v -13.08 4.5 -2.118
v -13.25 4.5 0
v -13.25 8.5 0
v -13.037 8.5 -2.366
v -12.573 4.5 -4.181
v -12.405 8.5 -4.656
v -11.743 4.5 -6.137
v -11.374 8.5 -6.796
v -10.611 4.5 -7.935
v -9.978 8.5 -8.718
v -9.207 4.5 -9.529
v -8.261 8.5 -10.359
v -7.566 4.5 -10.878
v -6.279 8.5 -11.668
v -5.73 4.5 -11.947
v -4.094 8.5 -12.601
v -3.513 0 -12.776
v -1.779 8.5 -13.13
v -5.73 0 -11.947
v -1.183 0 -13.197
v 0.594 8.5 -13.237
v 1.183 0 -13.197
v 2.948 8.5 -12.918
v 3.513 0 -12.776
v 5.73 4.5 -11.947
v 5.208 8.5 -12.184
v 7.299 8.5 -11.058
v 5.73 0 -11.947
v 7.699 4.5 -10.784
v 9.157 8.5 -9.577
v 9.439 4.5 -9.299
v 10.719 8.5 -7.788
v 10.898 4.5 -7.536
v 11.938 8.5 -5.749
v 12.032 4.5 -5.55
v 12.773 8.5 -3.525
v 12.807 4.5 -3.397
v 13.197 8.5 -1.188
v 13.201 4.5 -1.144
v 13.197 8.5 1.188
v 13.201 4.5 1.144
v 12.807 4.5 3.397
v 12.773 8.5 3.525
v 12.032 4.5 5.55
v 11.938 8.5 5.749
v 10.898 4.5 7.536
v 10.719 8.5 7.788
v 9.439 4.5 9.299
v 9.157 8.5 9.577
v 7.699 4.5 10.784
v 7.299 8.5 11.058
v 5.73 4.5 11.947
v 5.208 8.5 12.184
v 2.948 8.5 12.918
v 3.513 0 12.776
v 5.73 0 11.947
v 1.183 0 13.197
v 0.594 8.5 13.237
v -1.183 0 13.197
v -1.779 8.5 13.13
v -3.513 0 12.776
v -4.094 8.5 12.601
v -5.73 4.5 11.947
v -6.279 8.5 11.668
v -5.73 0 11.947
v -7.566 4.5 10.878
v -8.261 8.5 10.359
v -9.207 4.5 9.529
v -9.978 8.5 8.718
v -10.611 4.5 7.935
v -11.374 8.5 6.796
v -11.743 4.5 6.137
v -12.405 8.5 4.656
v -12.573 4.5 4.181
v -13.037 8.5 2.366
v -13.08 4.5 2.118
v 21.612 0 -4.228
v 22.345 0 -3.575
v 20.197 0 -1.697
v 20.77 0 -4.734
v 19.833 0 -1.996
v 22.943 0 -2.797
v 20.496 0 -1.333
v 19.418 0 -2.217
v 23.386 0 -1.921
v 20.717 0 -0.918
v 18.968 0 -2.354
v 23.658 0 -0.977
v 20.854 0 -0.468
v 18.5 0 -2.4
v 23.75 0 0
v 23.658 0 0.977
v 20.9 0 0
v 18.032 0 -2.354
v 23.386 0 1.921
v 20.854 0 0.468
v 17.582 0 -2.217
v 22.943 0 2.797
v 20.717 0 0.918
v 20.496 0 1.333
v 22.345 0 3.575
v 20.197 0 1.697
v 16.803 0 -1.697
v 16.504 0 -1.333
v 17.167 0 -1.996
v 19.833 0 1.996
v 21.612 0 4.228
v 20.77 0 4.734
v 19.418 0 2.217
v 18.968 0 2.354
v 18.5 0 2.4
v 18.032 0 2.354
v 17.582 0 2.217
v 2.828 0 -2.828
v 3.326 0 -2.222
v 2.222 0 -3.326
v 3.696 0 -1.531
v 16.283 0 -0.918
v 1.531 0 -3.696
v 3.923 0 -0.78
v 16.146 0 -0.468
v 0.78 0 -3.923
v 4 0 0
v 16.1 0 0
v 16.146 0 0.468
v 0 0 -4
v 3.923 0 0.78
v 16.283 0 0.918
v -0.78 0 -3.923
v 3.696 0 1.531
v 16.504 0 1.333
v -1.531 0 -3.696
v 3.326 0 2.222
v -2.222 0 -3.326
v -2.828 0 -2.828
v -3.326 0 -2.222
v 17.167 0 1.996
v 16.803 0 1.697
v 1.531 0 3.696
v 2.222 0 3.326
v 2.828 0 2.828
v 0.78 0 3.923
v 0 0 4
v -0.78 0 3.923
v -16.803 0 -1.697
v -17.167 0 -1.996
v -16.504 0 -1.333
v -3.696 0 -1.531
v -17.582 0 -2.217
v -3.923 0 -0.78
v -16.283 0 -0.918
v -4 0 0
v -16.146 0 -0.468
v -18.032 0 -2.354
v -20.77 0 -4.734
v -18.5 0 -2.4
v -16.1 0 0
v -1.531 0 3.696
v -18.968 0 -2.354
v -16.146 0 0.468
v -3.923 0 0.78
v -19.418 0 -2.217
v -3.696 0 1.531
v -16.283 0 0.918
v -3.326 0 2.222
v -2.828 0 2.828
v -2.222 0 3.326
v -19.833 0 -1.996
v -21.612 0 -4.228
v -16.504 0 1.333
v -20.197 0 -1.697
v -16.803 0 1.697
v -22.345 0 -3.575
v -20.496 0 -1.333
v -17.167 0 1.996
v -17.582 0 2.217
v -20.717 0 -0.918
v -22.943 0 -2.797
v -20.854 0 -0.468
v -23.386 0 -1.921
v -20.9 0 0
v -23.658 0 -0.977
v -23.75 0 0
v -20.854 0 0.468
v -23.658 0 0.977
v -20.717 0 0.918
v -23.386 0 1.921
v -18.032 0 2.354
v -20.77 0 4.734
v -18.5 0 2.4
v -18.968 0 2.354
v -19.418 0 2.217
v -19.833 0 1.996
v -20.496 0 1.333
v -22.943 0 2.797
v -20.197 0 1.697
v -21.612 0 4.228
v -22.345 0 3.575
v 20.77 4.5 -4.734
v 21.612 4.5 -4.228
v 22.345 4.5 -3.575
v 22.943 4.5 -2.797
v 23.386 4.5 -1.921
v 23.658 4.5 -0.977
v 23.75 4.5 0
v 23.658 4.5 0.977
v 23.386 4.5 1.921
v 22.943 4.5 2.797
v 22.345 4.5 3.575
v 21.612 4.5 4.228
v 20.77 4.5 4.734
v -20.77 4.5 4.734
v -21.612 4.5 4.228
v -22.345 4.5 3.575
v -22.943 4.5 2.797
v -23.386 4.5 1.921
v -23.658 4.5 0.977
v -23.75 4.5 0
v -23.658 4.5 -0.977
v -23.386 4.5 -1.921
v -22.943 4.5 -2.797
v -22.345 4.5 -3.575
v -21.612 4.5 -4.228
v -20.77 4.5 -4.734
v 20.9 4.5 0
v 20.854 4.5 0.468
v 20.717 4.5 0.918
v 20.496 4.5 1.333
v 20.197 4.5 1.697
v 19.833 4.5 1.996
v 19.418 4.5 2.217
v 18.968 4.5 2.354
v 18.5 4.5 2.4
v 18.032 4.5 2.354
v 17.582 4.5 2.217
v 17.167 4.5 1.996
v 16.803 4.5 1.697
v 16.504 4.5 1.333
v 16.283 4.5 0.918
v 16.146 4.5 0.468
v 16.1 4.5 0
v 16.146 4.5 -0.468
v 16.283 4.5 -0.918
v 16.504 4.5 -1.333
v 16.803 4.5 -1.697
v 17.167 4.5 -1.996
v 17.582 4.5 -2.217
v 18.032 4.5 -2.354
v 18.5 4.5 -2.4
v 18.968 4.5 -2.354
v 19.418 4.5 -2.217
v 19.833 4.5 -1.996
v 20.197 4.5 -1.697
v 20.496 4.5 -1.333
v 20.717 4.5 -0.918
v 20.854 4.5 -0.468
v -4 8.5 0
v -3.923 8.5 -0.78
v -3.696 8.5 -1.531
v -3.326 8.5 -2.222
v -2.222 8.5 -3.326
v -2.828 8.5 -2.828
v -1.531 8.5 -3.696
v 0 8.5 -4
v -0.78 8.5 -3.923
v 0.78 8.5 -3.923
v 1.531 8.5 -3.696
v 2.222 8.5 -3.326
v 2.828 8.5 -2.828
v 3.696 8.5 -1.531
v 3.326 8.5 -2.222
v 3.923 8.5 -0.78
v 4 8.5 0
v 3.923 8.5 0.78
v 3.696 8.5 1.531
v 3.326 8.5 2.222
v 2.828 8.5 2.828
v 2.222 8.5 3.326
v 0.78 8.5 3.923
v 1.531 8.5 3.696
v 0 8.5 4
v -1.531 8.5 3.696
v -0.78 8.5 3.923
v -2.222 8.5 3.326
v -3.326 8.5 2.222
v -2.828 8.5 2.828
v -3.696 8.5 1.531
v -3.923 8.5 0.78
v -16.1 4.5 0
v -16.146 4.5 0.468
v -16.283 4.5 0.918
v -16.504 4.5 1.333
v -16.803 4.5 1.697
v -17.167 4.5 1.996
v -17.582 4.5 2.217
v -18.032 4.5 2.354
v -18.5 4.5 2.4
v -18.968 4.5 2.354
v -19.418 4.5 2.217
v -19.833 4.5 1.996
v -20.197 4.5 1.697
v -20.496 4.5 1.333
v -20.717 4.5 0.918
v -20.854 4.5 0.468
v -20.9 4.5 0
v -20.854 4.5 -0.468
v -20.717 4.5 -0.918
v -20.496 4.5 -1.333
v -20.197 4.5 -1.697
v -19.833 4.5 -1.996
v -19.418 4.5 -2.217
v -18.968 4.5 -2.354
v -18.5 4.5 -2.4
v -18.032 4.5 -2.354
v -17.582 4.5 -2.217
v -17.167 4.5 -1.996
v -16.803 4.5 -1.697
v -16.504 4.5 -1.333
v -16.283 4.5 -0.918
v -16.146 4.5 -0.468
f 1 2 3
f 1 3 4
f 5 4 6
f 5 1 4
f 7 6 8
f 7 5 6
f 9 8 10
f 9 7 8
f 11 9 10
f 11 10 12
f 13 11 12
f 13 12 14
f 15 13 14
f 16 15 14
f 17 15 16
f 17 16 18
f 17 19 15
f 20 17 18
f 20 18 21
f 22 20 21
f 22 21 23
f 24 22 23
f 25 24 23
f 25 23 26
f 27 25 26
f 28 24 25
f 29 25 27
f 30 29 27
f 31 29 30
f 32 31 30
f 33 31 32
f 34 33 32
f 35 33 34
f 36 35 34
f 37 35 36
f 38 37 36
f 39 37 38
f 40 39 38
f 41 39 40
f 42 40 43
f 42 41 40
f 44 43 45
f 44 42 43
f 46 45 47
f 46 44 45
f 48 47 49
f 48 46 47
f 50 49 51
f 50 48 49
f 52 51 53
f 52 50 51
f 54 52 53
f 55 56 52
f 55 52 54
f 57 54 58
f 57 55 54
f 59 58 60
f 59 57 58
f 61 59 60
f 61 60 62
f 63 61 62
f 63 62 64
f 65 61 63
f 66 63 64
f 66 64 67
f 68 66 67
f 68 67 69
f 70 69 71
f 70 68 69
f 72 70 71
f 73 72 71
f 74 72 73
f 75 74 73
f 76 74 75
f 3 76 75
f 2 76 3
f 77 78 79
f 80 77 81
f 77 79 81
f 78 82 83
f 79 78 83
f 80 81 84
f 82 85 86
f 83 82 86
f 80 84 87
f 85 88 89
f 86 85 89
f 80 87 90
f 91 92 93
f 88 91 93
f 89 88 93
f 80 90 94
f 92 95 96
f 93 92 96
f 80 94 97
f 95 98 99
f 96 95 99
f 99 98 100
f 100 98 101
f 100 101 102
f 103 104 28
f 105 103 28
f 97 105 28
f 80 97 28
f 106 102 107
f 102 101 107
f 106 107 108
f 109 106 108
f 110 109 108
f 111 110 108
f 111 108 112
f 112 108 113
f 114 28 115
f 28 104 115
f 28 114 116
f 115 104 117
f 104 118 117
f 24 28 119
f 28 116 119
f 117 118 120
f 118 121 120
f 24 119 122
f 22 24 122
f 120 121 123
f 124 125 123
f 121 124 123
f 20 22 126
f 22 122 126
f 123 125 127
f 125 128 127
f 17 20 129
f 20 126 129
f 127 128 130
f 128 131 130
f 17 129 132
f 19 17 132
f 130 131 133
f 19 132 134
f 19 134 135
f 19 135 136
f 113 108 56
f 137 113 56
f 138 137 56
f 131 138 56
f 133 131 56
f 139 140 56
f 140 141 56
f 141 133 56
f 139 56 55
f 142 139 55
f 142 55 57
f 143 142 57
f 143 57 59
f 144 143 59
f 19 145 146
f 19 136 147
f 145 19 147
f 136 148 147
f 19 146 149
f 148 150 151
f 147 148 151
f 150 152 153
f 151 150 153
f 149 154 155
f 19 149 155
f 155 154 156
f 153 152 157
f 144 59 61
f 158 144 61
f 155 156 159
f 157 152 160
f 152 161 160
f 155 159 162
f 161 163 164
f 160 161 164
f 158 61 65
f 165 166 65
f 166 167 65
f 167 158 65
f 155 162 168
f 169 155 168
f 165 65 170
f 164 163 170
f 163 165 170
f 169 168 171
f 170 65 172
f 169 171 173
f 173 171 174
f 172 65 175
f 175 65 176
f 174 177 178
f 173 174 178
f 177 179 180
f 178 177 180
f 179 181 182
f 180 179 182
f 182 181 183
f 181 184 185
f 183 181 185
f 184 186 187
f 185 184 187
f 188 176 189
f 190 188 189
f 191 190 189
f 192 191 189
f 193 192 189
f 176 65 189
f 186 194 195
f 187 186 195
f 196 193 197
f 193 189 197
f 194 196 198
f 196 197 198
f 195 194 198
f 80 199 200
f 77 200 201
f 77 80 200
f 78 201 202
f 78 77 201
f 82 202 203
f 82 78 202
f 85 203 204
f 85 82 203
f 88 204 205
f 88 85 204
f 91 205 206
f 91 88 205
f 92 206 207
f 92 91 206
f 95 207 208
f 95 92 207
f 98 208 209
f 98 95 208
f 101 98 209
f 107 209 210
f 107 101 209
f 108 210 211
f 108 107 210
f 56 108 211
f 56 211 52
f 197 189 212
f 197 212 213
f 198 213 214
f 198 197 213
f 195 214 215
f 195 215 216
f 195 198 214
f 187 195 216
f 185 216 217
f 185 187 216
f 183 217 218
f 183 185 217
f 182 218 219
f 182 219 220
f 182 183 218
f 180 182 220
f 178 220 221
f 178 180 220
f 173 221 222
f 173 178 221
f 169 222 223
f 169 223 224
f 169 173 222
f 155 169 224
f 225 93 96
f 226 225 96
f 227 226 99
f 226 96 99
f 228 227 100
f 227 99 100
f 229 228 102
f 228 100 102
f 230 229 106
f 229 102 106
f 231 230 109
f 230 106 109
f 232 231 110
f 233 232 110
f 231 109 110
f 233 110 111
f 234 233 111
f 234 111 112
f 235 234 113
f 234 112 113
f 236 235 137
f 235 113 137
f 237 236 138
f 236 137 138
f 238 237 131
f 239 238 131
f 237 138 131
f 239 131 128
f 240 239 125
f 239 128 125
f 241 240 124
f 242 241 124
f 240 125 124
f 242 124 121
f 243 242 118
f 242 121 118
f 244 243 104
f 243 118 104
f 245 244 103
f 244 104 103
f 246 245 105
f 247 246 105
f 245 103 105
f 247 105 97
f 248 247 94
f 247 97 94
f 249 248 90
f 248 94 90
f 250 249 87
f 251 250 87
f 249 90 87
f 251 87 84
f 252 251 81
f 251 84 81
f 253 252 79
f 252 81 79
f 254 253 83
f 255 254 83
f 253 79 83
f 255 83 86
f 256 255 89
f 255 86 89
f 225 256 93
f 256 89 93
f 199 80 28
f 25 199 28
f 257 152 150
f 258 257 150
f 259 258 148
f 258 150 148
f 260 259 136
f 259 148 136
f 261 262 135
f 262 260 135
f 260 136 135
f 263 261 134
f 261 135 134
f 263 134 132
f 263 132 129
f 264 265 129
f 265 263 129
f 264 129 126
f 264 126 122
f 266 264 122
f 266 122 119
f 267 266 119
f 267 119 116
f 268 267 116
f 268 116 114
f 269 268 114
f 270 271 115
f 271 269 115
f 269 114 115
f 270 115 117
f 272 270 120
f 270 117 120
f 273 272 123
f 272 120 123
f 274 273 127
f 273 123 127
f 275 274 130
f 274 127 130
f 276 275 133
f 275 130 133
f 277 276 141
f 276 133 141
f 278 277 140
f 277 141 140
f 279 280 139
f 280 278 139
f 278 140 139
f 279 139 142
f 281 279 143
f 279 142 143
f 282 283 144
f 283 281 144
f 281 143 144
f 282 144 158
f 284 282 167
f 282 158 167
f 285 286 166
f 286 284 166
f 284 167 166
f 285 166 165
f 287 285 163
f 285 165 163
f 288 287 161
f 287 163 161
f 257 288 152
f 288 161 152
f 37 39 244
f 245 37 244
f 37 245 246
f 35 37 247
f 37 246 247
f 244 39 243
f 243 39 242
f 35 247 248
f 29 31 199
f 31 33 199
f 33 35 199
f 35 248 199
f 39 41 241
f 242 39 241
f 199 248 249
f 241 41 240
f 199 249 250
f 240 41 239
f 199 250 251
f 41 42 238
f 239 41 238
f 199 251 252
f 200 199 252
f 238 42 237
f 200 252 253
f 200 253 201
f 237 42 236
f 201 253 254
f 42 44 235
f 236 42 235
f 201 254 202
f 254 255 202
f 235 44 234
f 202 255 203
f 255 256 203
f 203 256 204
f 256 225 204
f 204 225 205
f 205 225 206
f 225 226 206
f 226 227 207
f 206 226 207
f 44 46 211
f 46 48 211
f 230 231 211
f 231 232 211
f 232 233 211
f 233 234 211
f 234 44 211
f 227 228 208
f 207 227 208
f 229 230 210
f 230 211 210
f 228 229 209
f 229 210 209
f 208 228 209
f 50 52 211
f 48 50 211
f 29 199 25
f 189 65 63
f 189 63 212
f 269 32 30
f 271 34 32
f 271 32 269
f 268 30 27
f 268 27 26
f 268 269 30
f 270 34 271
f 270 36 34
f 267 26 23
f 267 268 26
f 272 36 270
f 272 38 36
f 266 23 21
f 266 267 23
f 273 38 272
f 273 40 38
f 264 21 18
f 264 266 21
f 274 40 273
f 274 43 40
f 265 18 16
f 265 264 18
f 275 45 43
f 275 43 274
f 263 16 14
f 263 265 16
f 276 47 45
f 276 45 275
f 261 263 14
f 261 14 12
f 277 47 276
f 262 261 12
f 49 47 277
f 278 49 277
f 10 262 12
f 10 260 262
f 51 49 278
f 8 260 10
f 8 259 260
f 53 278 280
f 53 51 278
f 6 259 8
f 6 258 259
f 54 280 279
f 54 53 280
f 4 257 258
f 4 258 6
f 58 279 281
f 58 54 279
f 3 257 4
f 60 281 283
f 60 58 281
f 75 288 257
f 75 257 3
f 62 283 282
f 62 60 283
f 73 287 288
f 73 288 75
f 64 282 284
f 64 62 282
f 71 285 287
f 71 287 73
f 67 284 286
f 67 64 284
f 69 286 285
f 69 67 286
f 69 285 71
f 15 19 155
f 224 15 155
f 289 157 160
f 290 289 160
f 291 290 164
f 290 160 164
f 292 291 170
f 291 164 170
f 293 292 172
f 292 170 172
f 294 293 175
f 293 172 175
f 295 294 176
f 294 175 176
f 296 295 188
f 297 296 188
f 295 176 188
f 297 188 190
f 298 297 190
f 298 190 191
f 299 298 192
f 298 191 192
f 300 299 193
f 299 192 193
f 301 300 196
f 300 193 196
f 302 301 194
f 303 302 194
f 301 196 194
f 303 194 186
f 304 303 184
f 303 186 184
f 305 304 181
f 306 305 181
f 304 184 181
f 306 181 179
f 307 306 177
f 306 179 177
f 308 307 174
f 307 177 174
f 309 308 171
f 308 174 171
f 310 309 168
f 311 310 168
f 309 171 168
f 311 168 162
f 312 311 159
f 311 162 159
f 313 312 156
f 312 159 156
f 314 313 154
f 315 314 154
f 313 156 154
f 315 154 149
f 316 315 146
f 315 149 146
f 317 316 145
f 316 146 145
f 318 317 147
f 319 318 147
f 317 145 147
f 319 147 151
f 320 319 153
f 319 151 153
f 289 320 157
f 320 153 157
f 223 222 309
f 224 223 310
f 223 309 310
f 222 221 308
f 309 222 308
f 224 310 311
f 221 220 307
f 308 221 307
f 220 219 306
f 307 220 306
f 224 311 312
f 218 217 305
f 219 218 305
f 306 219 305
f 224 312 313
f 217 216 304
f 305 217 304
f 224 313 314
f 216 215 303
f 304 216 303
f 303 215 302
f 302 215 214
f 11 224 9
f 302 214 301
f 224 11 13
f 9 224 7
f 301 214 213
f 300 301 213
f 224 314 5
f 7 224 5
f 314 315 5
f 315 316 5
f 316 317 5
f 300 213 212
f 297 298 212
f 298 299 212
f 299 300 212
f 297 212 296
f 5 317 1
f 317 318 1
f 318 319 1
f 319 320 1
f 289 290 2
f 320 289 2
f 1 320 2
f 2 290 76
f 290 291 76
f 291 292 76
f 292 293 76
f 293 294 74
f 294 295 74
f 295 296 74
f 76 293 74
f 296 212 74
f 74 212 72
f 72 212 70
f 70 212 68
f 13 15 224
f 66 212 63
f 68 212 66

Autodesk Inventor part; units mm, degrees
ref_plane "YZ Plane" through (0, 0, 0) normal (1, 0, 0) x (0, 1, 0)
ref_plane "XZ Plane" through (0, 0, 0) normal (0, 1, 0) x (-1, 0, 0)
ref_plane "XY Plane" through (0, 0, 0) normal (0, 0, 1) x (1, 0, 0)
sketch "Sketch1" plane through (0, 0, 0) normal (0, 1, 0) x (-1, 0, 0)
  circle A0 centre (0, 0) radius 13.25
  circle A1 centre (0, 0) radius 4
  dimension "d0" = 26.5
  dimension "d1" = 8
extrude "Extrusion1" add sketch "Sketch1" along normal blind 8.5
sketch "Sketch2" plane through (0, 0, 0) normal (0, -1, 0) x (1, 0, 0)
  circle A0 centre (18.5, 0) radius 2.4
  circle A1 centre (-18.5, 0) radius 2.4
  circle A2 centre (18.5, 0) radius 5.25
  circle A3 centre (-18.5, 0) radius 5.25
  line L0 (20.7703, -4.7337) -> (5.7297, -11.9471)
  circle A4 centre (0, 0) radius 13.25 projected
  line L1 (20.7703, 4.7337) -> (5.7297, 11.9471)
  line L2 (-5.7297, -11.9471) -> (-20.7703, -4.7337)
  line L3 (-5.7297, 11.9471) -> (-20.7703, 4.7337)
  point P0 (0, 18.5)
  point P1 (0, -18.5)
  dimension "d6" = 4.8
  dimension "d7" = 4.8
  dimension "d8" = 37
  dimension "d9" = 18.5
  dimension "d10" = 10.5
  dimension "d11" = 10.5
extrude "Extrusion2" add sketch "Sketch2" against normal blind 4.5 contours A2 | A2 A4 L1 | L0 A4 A2 | A4 A3 L3 | L2 A3 A4 | A3
properties part number "O_Do_Lan" material "Brass, Soft Yellow, Welded"
